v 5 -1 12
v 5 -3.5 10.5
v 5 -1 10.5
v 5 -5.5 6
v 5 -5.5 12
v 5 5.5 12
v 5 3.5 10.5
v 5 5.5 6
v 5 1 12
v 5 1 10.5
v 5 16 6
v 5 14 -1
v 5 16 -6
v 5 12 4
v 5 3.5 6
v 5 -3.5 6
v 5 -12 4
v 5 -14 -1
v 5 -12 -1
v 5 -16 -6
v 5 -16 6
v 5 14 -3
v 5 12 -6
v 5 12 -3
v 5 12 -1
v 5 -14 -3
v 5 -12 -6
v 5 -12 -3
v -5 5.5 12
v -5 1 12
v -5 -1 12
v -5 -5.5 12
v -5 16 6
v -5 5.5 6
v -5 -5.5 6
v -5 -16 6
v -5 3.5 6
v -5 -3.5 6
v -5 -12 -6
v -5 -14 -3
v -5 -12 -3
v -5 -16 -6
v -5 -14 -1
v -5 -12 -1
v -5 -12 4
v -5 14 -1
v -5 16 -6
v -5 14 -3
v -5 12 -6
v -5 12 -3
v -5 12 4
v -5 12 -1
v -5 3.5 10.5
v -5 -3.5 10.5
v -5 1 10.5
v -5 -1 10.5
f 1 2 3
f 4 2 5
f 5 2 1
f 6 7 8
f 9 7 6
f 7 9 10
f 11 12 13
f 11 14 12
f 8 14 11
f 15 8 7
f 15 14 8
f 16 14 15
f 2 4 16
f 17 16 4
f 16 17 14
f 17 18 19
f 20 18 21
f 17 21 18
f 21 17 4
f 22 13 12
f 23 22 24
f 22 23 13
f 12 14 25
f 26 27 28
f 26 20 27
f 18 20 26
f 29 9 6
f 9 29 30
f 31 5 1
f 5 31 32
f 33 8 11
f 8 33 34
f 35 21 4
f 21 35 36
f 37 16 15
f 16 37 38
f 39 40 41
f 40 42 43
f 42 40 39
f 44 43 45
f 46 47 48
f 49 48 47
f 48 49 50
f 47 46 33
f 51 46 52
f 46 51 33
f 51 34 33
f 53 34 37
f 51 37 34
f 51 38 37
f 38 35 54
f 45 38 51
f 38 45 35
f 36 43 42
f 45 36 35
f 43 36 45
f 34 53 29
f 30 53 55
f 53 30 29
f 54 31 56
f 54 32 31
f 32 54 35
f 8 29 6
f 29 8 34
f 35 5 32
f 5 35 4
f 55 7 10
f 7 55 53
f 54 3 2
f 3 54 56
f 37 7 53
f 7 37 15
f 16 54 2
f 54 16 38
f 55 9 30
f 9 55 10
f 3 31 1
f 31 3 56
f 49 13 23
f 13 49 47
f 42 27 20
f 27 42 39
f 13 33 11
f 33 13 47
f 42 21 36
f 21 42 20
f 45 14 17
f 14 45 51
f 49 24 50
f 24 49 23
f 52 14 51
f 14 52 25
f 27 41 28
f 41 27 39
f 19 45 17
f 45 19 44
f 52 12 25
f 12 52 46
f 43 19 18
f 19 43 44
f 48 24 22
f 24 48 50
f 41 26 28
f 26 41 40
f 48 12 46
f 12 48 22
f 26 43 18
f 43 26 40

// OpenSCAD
union() {
	difference() {
		difference() {	
			translate([0,0,9])
				cube([10, 11, 6], center=true);
			translate([-1,0,8])
				cube([74, 7, 5], center=true);
		}
		translate([-1,0,10])
			cube([74, 2, 5], center=true);	
	}
	difference() {
		difference() {
			cube([10,32,12], center=true);
			translate([2, 0, -2])
			   cube([70,24,12], center=true);
		}
		translate([2, 0, -2])
		   cube([70,28,2], center=true);	
	}
}
